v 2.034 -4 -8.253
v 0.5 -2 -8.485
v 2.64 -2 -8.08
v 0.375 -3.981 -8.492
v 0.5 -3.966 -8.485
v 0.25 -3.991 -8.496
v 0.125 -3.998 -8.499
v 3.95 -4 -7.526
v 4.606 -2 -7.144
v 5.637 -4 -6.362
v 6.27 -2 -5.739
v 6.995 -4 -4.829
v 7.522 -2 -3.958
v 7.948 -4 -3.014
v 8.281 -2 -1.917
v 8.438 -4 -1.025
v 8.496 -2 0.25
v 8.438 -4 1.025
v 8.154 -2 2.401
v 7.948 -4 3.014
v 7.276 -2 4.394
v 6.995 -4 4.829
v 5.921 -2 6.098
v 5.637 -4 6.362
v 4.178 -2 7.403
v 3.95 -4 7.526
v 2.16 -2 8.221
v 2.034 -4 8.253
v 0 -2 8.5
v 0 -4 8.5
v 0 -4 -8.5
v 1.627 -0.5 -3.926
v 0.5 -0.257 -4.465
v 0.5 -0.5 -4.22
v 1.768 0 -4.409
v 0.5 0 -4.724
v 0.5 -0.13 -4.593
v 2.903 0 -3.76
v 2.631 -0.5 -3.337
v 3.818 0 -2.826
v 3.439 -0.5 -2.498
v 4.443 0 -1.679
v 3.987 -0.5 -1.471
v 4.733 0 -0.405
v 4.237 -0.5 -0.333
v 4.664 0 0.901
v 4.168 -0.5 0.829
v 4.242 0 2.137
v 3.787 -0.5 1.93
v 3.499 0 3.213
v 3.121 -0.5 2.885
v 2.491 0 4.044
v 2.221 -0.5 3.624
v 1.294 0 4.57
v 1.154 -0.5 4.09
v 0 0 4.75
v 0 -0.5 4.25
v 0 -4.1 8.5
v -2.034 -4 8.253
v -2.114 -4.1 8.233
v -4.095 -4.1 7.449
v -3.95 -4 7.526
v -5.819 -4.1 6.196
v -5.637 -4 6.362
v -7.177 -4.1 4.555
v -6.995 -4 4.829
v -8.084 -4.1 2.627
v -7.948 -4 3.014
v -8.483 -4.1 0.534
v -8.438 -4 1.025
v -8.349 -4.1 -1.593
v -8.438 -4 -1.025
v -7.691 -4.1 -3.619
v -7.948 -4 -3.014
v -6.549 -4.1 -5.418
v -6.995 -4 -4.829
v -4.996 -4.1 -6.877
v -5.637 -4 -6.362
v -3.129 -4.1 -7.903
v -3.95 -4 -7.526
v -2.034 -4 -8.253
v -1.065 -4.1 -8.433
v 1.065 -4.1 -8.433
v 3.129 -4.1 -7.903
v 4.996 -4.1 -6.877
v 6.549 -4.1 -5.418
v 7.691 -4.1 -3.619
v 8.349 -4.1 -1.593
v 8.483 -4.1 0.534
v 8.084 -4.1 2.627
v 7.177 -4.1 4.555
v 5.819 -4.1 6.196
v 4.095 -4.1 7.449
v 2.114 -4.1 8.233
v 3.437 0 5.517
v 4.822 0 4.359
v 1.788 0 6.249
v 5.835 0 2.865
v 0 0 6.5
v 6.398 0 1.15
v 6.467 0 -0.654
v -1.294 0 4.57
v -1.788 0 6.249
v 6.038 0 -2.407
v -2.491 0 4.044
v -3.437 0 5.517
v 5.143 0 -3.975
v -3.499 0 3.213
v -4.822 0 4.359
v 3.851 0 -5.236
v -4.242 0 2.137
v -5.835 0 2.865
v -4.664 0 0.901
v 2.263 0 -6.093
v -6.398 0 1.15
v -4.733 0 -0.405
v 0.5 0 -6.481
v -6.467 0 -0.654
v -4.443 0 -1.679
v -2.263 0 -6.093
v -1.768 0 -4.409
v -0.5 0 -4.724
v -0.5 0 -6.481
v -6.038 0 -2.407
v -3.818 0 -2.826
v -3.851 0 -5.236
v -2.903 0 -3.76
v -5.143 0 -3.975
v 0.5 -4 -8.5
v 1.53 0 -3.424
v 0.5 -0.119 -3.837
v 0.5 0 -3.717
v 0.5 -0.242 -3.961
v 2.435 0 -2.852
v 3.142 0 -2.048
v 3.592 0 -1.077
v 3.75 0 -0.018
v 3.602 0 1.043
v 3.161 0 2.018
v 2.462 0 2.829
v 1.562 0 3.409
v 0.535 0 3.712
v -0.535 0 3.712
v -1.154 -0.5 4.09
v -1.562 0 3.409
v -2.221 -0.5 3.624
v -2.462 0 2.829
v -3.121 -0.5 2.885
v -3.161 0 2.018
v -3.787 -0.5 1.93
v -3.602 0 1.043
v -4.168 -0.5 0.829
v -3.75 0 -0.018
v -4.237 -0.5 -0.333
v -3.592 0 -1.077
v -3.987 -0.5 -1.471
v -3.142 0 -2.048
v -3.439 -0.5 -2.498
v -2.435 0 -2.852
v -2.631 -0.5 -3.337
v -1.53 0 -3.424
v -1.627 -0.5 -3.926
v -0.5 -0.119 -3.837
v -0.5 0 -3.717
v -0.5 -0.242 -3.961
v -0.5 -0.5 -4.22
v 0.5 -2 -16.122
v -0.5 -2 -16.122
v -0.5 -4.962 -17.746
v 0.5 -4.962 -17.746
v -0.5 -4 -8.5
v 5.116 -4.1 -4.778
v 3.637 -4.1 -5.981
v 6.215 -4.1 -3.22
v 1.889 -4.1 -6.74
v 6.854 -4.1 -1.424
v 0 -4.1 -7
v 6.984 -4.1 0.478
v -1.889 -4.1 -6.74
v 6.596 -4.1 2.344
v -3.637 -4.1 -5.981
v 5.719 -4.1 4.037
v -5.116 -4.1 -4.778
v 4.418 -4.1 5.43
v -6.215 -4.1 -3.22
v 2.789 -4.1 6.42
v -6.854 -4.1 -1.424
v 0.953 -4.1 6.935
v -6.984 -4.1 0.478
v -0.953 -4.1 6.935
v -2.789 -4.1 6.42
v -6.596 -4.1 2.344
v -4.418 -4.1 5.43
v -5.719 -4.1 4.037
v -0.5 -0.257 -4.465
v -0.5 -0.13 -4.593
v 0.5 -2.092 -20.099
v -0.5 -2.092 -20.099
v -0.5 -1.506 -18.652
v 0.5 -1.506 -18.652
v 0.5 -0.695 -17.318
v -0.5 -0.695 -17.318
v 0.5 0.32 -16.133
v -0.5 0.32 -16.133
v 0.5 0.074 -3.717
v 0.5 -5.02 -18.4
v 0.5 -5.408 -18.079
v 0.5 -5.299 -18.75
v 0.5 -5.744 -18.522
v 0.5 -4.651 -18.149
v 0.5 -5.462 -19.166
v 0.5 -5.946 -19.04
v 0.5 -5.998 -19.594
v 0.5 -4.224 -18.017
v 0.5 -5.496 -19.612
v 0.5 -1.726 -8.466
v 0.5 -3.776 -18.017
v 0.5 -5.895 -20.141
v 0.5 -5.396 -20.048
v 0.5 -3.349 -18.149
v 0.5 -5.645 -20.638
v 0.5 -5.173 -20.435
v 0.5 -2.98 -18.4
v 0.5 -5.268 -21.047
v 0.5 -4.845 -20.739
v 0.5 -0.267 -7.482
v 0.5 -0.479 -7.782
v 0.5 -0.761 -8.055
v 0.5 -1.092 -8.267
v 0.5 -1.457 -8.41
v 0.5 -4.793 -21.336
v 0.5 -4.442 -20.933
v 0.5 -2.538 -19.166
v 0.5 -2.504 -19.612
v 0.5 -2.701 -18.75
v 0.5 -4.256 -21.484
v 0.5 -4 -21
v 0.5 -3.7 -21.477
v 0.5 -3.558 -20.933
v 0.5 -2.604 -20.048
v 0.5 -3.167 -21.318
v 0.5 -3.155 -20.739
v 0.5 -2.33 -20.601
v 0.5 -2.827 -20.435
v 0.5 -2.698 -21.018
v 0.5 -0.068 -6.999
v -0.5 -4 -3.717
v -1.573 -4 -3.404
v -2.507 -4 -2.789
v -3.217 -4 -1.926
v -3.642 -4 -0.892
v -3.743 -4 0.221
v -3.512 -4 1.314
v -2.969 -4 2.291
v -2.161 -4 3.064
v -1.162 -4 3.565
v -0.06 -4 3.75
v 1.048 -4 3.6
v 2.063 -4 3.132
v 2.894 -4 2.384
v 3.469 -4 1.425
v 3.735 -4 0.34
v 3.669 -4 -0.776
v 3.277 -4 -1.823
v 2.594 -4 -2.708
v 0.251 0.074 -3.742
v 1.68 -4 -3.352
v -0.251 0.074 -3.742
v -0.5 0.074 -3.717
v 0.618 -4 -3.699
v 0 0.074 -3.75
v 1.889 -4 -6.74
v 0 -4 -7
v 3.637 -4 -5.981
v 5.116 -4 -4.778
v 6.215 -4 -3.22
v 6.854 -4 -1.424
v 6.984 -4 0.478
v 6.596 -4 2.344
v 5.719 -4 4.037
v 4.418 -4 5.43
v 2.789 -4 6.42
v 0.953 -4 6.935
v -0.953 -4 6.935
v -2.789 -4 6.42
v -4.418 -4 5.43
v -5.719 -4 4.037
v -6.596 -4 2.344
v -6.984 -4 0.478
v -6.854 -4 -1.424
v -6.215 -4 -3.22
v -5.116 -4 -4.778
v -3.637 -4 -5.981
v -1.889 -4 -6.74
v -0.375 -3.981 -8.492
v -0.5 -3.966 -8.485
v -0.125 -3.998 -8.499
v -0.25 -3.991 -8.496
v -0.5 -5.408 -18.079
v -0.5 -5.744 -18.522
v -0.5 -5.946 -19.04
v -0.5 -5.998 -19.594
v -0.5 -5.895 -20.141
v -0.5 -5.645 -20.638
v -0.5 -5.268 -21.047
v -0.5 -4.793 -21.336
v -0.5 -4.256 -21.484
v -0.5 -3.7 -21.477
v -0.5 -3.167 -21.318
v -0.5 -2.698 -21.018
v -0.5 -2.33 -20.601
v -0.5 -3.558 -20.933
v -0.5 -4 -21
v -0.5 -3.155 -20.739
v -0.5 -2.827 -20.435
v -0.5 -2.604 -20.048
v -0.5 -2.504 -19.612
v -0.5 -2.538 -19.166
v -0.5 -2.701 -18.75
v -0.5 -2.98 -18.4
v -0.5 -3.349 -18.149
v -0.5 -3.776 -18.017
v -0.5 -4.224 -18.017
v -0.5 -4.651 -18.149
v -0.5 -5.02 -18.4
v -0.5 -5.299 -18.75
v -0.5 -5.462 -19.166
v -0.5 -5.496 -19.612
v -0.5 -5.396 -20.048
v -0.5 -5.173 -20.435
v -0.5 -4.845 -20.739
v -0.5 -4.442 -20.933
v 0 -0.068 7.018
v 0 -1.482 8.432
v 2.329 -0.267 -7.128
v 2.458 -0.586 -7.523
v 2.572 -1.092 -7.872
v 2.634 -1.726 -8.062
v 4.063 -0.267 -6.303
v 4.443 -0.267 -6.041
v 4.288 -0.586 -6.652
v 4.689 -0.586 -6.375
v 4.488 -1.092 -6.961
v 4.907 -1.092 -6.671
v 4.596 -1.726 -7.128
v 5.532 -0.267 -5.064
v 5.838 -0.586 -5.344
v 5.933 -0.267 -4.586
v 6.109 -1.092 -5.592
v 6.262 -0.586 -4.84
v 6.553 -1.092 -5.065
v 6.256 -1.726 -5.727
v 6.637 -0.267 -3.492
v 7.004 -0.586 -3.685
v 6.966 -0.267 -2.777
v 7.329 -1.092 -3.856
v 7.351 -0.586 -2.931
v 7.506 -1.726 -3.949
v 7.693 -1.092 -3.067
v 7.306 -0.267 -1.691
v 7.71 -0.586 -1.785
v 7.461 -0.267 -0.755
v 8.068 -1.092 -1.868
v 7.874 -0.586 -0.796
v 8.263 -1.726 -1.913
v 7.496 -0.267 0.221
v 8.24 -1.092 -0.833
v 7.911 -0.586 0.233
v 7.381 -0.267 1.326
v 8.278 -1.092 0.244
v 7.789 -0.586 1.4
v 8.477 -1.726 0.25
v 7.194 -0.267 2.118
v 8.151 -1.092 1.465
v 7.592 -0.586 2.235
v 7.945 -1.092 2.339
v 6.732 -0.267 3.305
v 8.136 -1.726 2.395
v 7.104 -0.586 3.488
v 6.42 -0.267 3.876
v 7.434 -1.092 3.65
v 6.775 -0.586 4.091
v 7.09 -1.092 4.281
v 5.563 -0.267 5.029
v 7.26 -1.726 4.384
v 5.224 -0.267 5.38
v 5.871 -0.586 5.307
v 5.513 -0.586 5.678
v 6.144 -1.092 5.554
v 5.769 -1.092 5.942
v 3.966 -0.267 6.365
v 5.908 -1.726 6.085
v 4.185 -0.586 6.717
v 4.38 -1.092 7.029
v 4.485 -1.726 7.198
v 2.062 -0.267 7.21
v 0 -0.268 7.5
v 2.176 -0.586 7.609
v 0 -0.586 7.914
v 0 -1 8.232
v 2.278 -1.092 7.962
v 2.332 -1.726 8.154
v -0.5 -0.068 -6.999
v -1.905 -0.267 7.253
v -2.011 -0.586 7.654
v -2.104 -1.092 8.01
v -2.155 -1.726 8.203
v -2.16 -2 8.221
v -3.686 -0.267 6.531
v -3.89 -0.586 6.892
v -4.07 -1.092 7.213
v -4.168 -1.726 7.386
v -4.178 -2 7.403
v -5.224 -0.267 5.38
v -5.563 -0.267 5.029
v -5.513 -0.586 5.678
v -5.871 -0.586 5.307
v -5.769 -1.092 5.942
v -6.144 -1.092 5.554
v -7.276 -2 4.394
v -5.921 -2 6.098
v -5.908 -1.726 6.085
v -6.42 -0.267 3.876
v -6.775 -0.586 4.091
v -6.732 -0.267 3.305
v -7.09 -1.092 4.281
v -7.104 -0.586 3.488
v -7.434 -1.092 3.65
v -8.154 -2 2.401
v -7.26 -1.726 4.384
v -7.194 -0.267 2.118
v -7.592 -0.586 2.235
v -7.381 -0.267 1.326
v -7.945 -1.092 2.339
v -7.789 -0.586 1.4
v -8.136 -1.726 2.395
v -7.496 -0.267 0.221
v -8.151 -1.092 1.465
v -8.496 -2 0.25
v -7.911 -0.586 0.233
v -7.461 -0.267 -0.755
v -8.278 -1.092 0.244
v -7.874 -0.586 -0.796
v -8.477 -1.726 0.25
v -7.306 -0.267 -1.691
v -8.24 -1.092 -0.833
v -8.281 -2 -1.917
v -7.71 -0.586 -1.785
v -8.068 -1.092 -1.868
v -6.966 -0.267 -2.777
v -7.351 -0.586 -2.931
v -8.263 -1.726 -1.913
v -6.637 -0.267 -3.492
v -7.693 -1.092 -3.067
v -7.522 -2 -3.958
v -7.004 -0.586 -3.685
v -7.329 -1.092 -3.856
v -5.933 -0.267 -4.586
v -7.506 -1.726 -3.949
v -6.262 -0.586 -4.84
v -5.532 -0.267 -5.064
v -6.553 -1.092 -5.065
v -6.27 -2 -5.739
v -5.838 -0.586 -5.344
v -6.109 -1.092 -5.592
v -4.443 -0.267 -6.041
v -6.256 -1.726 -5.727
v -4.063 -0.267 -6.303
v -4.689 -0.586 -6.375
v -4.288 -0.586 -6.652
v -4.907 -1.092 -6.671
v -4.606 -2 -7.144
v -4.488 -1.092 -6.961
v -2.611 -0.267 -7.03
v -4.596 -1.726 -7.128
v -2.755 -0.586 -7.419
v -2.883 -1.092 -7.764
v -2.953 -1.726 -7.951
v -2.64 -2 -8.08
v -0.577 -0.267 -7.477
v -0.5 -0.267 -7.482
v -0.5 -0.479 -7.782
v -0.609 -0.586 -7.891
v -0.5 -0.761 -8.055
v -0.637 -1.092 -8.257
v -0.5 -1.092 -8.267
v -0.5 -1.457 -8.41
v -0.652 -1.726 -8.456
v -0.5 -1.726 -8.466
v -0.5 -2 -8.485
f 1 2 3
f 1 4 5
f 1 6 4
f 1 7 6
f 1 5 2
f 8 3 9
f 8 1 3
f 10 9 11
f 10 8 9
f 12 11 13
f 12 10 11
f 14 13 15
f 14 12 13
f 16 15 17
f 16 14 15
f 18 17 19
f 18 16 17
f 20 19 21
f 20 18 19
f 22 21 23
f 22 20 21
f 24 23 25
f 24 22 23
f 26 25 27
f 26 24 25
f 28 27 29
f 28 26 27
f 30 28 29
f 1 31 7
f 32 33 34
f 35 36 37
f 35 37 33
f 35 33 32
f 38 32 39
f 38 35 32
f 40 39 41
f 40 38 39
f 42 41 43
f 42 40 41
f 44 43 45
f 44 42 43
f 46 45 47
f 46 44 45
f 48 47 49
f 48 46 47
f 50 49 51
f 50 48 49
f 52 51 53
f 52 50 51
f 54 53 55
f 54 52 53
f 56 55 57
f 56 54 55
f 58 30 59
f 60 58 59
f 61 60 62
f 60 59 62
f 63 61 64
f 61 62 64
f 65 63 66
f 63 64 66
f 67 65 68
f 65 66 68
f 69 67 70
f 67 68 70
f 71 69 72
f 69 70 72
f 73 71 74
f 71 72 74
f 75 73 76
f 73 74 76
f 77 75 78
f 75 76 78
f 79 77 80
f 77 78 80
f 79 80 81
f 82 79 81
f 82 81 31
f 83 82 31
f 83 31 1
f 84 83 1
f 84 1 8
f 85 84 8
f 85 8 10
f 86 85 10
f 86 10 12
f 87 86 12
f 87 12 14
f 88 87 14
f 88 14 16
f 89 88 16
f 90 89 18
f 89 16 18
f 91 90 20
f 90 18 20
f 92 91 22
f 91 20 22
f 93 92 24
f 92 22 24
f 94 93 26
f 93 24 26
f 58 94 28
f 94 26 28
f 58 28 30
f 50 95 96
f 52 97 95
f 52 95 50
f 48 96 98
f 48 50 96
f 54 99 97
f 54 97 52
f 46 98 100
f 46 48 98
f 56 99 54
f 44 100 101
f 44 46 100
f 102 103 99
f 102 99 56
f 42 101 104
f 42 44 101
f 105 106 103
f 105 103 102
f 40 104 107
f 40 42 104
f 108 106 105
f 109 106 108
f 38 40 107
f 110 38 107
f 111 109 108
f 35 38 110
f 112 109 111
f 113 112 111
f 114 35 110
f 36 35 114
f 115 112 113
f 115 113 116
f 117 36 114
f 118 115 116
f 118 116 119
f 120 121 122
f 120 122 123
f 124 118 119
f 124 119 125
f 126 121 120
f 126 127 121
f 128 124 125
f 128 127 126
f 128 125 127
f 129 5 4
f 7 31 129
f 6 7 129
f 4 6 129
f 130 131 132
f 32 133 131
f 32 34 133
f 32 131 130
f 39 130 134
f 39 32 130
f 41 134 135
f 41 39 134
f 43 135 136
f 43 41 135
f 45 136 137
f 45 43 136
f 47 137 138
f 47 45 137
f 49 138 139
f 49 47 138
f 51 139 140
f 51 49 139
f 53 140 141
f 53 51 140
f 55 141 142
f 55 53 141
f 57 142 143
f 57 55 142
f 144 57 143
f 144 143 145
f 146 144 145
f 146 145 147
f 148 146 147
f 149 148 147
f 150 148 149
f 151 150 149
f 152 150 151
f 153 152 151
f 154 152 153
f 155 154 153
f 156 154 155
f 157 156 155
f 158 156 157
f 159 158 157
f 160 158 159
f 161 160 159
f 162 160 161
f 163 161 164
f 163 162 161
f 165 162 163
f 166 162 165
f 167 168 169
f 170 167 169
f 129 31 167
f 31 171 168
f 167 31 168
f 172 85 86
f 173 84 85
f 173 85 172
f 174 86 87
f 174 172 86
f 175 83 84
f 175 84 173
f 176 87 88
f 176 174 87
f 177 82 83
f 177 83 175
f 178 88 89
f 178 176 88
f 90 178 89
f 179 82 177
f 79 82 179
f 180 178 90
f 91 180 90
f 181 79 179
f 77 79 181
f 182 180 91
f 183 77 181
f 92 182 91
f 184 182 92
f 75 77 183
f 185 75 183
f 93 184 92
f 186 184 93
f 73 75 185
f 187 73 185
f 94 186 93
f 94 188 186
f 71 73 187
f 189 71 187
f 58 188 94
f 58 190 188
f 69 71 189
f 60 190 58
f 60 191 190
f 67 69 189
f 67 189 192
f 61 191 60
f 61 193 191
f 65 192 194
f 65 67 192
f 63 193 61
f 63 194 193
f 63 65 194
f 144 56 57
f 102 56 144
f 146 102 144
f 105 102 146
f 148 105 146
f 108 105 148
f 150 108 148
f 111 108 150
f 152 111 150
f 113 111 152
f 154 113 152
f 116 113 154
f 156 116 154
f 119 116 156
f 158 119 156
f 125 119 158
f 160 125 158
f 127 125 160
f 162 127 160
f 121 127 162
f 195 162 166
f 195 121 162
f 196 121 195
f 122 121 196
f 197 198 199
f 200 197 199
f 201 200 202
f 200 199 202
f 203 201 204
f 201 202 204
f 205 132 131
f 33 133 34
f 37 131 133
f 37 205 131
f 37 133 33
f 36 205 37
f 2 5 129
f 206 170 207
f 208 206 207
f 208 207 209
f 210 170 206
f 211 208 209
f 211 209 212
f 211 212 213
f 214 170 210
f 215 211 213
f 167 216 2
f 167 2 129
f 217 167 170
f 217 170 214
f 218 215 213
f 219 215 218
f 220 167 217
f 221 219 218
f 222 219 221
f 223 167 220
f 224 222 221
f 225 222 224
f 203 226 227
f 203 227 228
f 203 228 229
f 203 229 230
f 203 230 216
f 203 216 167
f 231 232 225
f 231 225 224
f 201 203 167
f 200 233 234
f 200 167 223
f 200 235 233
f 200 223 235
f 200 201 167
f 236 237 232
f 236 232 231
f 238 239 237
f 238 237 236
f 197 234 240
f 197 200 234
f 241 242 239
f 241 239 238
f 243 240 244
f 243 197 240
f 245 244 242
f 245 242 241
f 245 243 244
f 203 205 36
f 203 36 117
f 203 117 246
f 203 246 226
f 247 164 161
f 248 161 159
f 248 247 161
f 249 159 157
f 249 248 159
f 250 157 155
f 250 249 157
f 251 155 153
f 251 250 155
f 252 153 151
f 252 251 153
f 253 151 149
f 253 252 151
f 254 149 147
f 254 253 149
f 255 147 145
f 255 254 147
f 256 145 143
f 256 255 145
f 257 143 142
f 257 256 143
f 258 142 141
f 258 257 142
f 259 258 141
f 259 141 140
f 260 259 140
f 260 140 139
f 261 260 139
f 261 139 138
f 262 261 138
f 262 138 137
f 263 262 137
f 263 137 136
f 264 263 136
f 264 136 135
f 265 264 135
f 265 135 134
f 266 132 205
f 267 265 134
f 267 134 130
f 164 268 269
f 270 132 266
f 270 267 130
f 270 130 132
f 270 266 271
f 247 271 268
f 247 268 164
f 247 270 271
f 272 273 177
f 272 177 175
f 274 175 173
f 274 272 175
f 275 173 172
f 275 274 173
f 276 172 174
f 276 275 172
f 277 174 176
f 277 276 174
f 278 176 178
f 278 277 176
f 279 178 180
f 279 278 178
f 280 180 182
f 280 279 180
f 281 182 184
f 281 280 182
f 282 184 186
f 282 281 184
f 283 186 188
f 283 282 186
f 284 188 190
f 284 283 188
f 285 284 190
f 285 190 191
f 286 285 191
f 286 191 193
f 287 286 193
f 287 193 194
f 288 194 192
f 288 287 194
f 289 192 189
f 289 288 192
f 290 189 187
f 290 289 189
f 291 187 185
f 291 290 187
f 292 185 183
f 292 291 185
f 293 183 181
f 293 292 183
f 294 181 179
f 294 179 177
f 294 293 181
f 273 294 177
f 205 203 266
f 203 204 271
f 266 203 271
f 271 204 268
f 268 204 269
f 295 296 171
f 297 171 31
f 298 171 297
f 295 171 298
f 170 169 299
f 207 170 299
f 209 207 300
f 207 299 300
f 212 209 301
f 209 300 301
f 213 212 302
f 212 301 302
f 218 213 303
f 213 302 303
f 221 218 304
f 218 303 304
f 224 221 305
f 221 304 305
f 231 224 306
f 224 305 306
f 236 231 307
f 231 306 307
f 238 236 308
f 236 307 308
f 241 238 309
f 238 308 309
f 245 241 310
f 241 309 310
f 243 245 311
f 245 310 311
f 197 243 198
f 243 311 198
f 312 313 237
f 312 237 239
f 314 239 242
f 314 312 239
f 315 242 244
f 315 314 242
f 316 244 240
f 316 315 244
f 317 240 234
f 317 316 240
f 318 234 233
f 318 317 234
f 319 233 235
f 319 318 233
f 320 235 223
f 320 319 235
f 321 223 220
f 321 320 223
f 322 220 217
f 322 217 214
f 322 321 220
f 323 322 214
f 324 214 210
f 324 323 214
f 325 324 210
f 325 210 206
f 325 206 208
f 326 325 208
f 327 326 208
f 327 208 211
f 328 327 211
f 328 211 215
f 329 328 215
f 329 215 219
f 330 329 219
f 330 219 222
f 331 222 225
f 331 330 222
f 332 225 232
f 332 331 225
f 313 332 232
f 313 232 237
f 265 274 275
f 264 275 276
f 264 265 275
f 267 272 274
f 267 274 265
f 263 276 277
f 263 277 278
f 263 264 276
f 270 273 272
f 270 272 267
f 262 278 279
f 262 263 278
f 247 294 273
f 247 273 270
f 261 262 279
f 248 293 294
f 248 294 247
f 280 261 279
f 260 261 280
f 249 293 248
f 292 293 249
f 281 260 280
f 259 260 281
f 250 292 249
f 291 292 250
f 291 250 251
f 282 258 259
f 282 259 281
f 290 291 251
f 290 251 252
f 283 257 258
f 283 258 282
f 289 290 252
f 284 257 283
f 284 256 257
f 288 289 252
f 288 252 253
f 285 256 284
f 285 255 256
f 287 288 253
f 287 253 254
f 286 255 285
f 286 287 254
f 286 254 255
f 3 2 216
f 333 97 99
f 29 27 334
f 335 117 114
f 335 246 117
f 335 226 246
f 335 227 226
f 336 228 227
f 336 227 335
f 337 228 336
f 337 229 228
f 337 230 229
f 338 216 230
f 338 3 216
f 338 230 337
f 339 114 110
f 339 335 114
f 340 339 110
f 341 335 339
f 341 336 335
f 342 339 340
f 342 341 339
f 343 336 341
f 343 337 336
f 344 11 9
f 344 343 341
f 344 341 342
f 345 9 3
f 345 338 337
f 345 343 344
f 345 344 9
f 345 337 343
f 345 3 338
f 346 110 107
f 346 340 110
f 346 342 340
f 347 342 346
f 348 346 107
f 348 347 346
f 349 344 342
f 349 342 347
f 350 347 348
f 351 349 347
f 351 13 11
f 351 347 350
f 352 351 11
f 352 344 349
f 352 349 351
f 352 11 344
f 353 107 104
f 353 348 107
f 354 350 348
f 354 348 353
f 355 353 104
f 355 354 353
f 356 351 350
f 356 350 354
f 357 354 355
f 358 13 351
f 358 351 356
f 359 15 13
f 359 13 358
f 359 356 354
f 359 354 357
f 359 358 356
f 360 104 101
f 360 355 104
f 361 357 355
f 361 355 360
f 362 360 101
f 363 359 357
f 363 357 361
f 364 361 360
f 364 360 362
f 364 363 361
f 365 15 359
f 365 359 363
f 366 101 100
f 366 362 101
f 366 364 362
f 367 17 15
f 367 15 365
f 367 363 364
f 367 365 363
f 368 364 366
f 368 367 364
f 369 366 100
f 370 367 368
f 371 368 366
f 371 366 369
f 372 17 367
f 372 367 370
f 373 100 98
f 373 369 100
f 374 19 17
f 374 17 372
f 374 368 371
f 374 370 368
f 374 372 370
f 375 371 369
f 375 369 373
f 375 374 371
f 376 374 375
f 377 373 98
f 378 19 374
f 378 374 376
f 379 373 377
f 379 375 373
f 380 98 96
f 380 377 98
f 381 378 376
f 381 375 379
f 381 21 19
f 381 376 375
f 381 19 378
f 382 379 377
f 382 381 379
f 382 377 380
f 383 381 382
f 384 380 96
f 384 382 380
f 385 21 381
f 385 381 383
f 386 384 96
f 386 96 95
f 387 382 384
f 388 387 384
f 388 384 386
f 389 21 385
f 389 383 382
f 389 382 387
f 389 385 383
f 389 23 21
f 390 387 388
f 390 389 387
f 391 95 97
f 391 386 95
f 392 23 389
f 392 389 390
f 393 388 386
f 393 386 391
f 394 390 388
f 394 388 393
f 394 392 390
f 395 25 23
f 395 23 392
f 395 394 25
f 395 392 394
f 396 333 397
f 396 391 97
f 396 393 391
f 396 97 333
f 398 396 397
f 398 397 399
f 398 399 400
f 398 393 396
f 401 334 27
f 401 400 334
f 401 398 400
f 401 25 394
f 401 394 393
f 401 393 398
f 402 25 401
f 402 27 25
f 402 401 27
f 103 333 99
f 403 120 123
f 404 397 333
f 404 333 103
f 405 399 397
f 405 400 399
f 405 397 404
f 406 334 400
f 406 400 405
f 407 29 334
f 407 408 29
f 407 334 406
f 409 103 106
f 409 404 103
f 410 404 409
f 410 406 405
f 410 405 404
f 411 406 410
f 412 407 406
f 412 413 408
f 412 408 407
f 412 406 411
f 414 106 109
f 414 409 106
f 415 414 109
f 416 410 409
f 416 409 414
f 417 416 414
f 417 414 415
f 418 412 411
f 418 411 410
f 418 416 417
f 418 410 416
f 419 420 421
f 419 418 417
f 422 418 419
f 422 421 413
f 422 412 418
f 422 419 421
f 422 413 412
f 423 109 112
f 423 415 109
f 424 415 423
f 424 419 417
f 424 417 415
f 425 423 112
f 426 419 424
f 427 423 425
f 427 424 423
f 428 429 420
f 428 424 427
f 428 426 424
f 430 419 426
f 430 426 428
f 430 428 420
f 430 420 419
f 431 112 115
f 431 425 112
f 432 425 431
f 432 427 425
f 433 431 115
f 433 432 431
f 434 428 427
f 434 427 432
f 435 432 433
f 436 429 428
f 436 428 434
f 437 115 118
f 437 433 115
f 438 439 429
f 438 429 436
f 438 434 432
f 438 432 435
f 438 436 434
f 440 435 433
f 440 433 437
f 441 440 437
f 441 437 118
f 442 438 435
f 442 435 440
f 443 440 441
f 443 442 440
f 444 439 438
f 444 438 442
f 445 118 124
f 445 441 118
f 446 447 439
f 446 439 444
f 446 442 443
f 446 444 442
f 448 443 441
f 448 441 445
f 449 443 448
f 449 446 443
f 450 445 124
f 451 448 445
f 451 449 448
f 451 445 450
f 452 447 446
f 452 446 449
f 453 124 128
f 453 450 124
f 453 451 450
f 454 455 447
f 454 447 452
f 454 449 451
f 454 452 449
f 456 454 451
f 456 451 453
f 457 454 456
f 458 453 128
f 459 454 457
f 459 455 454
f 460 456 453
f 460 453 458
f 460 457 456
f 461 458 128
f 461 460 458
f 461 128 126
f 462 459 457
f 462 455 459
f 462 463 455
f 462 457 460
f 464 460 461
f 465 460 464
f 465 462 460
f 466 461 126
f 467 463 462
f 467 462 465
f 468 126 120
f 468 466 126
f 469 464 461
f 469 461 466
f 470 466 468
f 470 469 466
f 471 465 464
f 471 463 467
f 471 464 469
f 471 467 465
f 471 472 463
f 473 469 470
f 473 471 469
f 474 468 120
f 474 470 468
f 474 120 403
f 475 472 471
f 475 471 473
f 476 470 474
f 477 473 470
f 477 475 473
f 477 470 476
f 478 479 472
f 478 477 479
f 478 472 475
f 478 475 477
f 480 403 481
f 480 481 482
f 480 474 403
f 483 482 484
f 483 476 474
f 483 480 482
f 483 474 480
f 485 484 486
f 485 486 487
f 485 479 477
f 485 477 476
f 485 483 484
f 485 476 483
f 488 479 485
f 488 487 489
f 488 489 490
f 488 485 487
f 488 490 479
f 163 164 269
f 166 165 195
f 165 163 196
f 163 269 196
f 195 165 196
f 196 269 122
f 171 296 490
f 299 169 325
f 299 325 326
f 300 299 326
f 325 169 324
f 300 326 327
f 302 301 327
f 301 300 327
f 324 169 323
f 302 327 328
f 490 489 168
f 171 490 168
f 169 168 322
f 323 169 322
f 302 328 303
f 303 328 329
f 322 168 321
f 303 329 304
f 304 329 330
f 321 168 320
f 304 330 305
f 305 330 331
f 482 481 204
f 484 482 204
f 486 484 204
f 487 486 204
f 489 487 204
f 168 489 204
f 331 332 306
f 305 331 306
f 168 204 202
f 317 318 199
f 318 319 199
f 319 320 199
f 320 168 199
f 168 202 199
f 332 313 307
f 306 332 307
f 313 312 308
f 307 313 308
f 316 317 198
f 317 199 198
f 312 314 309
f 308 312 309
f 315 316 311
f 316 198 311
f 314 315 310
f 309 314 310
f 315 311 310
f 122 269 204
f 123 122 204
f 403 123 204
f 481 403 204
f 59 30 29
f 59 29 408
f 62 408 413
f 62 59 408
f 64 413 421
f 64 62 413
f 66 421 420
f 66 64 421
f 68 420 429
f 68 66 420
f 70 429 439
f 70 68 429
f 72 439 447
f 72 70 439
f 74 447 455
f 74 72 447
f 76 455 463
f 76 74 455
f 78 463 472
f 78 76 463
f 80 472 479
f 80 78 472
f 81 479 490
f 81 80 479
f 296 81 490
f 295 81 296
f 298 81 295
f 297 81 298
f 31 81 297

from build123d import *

# Parameters (mm, degrees)
FILLET1_R                = 2
SKETCH5_R                = 8.5
SKETCH5_R_2              = 7
BOSS_EXTRUDE1_DEPTH      = 0.1
BOSS_EXTRUDE2_DEPTH      = 0.5
BOSS_EXTRUDE2_DEPTH_BACK = 0.5
SKETCH6_R                = 1.5
CUT_EXTRUDE1_DEPTH       = 24.885141976
CUT_EXTRUDE1_DEPTH_BACK  = 24.885141976
SKETCH7_R                = 3.75


with BuildPart() as part:
    # Sketch4 → Revolve1 (revolve)
    with BuildSketch(Plane(origin=(0, 0, 0), x_dir=(0, 0, -1), z_dir=(1, 0, 0))):
        Polygon((0, 0), (-3.75, 0), (-4.25, -0.5), (-4.75, 0), (-8.5, 0), (-8.5, -4), (0, -4), align=None)
    revolve(axis=Axis((0, 1.890471386, 0), (0, -1, 0)))

    # Fillet1
    fillet1_edges = [part.edges().sort_by_distance(p)[0] for p in [
        (0, 0, -8.5),
    ]]
    fillet(fillet1_edges, radius=FILLET1_R)



with BuildPart() as body_2:
    # Sketch5 → Boss-Extrude1 (new body)
    with BuildSketch(Plane.XZ.offset(4)):
        Circle(SKETCH5_R)
        Circle(SKETCH5_R_2, mode=Mode.SUBTRACT)
    extrude(amount=BOSS_EXTRUDE1_DEPTH)


with BuildPart() as part_1:
    add(part.part)

    add(body_2.part)  # Boss-Extrude2 merges body 2
    # Sketch6 → Boss-Extrude2 (add, two sides: drawn at the far end of the back side and taken through both)
    with BuildSketch(Plane(origin=(0, 0, 0), x_dir=(0, 0, -1), z_dir=(1, 0, 0)).offset(-BOSS_EXTRUDE2_DEPTH_BACK)):
        with BuildLine():
            Line((16.132863069, 0.320027848), (0, 0))
            Line((0, 0), (0, -0.907670556))
            Line((0, -0.907670556), (7.174444166, -0.907670556))
            Line((7.174444166, -0.907670556), (8.5, -4))
            Line((8.5, -4), (16.12184584, -1.999779955))
            Line((16.12184584, -1.999779955), (17.746442499, -4.961787965))
            ThreePointArc((17.746442499, -4.961787965), (21.046890478, -5.267726252), (20.098589091, -2.09167846))
            ThreePointArc((20.098589091, -2.09167846), (17.968839585, -1.127360353), (16.132863069, 0.320027848))
        make_face()
        with Locations((19.5, -4)):
            Circle(SKETCH6_R, mode=Mode.SUBTRACT)
    extrude(amount=BOSS_EXTRUDE2_DEPTH + BOSS_EXTRUDE2_DEPTH_BACK)

    # Sketch7 → Cut-Extrude1 (cut, two sides: drawn at the far end of the back side and taken through both)
    with BuildSketch(Plane(origin=(0, 0, 0), x_dir=(1, 0, 0), z_dir=(0, 1, 0)).offset(-CUT_EXTRUDE1_DEPTH_BACK)):
        Circle(SKETCH7_R)
    extrude(amount=CUT_EXTRUDE1_DEPTH + CUT_EXTRUDE1_DEPTH_BACK, mode=Mode.SUBTRACT)


solid = part_1.part
